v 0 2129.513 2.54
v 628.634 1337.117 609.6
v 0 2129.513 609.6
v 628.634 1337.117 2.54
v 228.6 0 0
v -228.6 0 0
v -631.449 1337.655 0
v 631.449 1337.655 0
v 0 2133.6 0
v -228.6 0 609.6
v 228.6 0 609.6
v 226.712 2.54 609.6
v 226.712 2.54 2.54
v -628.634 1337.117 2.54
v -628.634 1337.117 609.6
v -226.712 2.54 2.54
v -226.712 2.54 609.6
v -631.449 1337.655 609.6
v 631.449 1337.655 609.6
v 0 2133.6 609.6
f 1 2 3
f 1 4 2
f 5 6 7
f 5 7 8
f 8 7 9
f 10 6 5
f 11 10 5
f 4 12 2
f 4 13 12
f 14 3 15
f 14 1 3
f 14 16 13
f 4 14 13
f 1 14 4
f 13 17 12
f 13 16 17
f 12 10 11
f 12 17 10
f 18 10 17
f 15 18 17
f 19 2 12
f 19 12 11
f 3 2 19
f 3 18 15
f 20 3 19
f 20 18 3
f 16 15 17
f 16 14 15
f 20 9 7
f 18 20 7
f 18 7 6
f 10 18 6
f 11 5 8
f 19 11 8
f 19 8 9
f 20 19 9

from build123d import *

# Parameters (mm, degrees)
F1_DEPTH = 609.6
F2_T     = -2.54


with BuildPart() as f1:
    # F0 (on Top) → F1 (new body)
    with BuildSketch(Plane.XY):
        Polygon((-228.6, 0), (0, 0), (0, 2133.6), (-631.449106, 1337.655261), align=None)
        Polygon((0, 2133.6), (0, 0), (228.6, 0), (631.449106, 1337.655261), align=None)
    extrude(amount=F1_DEPTH)

    # F2
    f2_openings = [f1.faces().sort_by_distance(p)[0] for p in [
        (0, 1025.524209, 609.6),
    ]]
    offset(amount=F2_T, openings=f2_openings)


solid = f1.part
